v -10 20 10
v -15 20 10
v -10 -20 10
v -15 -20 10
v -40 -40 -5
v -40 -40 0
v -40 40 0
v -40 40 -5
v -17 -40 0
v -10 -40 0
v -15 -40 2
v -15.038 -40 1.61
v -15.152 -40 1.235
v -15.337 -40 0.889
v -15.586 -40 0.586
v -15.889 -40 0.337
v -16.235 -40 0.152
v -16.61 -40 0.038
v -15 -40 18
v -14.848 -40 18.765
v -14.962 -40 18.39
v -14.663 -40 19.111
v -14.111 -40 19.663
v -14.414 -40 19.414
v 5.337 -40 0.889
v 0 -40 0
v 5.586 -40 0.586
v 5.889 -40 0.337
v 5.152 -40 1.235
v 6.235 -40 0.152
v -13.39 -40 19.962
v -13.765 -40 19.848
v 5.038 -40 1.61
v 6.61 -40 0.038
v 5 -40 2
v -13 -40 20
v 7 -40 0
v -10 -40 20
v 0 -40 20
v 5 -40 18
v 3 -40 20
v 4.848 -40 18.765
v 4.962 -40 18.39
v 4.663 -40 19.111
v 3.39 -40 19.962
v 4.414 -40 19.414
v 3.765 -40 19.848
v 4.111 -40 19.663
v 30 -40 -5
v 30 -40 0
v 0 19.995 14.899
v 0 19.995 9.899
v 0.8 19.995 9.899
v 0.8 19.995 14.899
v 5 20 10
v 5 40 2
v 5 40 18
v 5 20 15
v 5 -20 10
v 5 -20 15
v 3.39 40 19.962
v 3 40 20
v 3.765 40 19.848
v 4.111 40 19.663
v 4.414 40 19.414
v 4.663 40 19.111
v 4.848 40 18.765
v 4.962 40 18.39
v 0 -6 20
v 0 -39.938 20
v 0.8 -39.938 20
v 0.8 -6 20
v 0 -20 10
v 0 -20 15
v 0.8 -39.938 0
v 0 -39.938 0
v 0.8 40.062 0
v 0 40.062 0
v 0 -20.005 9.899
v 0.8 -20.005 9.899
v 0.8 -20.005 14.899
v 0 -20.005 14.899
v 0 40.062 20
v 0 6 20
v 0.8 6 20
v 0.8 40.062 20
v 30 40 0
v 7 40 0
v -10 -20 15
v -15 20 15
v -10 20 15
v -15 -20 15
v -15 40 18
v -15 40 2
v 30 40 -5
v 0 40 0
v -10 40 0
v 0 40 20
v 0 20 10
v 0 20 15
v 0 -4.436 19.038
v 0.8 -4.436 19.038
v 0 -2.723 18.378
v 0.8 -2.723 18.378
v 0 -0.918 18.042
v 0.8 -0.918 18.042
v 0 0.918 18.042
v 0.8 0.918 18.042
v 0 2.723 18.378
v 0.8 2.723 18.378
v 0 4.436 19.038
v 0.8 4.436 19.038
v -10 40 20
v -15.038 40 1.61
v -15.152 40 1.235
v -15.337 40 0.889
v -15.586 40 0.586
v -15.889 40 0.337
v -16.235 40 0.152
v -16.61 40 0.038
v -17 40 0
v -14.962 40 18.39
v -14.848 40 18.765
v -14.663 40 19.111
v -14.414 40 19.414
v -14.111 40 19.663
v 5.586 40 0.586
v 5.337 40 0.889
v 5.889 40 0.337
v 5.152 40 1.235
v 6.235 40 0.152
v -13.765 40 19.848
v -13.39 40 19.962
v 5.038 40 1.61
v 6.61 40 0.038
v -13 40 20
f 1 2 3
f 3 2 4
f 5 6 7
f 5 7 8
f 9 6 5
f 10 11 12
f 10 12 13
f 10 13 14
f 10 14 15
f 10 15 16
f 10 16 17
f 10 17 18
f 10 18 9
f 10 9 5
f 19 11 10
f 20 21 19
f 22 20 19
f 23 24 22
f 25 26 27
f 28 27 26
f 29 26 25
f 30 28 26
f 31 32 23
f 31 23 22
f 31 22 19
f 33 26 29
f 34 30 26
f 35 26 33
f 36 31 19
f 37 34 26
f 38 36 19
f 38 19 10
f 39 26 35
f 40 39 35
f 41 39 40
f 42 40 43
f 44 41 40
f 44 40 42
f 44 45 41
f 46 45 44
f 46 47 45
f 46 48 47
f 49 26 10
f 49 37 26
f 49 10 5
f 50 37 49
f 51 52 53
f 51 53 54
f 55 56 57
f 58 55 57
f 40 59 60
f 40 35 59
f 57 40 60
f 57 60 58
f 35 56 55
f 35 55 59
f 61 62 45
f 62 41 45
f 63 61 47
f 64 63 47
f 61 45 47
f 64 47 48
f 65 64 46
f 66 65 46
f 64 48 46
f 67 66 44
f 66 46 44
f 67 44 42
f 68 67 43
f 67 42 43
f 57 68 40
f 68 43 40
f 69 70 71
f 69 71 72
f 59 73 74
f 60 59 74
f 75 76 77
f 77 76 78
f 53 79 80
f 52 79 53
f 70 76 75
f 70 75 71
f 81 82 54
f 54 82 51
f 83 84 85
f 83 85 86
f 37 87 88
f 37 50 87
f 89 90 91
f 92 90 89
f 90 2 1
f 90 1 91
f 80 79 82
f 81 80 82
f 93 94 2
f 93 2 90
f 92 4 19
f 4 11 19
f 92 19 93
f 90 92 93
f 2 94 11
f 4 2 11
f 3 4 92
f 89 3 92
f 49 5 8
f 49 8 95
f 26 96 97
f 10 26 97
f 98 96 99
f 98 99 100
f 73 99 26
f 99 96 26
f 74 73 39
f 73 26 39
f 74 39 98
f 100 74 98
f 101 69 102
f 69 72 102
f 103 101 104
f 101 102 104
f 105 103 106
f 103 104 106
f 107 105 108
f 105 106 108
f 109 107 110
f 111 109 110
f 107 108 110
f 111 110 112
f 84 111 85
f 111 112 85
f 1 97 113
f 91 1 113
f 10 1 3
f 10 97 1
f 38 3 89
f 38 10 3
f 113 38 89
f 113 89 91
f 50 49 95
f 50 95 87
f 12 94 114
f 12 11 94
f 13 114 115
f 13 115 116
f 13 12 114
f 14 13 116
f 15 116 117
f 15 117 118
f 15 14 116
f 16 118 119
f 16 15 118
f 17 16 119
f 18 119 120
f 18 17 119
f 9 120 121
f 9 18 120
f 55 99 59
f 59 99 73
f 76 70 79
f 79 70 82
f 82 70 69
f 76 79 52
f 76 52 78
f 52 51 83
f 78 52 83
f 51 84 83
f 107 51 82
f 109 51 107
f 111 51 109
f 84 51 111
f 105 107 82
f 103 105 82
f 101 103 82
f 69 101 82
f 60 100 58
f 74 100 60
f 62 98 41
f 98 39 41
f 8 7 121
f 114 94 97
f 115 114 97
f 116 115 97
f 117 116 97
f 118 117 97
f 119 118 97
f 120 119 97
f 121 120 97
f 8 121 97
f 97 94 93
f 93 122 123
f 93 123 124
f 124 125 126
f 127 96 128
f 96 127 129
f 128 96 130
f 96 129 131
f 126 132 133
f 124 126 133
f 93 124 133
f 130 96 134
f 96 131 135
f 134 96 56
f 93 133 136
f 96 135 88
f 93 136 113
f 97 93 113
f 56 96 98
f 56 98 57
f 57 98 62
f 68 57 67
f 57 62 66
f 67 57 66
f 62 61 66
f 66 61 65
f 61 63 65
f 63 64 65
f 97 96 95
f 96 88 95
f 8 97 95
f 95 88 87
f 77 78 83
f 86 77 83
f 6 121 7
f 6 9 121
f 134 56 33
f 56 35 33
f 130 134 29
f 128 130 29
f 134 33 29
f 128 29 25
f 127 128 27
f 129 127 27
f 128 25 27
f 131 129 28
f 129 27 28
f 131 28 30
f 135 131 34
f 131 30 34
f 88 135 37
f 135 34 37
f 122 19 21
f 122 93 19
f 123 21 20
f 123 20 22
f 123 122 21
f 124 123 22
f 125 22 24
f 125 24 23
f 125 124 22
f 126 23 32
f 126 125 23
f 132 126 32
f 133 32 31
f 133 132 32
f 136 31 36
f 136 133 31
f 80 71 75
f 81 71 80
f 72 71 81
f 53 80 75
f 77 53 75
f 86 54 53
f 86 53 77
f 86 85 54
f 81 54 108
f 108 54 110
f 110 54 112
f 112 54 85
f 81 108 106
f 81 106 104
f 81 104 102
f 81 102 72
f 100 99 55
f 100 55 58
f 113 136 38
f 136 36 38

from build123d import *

# Parameters (mm, degrees)
F0_W     = 5
F0_H     = 20
F1_DEPTH = 40
F2_R     = 2
F3_R     = 2
F4_W     = 40
F4_H     = 5
F5_DEPTH = 25
F6_R     = 10
F7_DEPTH = 25
F8_W     = 80
F8_H     = 20
F8_W_2   = 40
F8_H_2   = 5
F9_DEPTH = 0.8


with BuildPart() as f1:
    # F0 (on Front) → F1 (new body, symmetric)
    with BuildSketch(Plane.XZ):
        with Locations((-12.5, 10)):
            Rectangle(F0_W, F0_H)
        Polygon((0, 0), (-10, 0), (-15, 0), (-40, 0), (-40, -5), (0, -5), align=None)
        with Locations((2.5, 10)):
            Rectangle(F0_W, F0_H)
        Polygon((5, 0), (0, 0), (0, -5), (30, -5), (30, 0), align=None)
    extrude(amount=F1_DEPTH, both=True)

    # F2
    f2_edges = [f1.edges().sort_by_distance(p)[0] for p in [
        (5, 0, 0),
        (-15, 0, 0),
    ]]
    fillet(f2_edges, radius=F2_R)

    # F3
    f3_edges = [f1.edges().sort_by_distance(p)[0] for p in [
        (-15, 0, 20),
        (5, 0, 20),
    ]]
    fillet(f3_edges, radius=F3_R)

    # F4 (on face) → F5 (cut)
    with BuildSketch(Plane(origin=(-15, 0, 0), x_dir=(0, -1, 0), z_dir=(-1, 0, 0))):
        with Locations((0, 12.5)):
            Rectangle(F4_W, F4_H)
    extrude(amount=-F5_DEPTH, mode=Mode.SUBTRACT)


with BuildPart() as f7:
    # F6 (on face) → F7 (new body)
    with BuildSketch(Plane.YZ.offset(5)):
        with Locations((0, 28)):
            Circle(F6_R)
    extrude(amount=-F7_DEPTH)


with BuildPart() as f9:
    # F8 (on Right) → F9 (new body)
    with BuildSketch(Plane.YZ):
        with Locations((0.0616917014, 10)):
            Rectangle(F8_W, F8_H)
        with Locations((-0.0052317232, 12.3988804966)):
            Rectangle(F8_W_2, F8_H_2, mode=Mode.SUBTRACT)
    extrude(amount=F9_DEPTH)

    # F10: cut F7
    add(f7.part, mode=Mode.SUBTRACT)


solid = Compound([f1.part, f9.part])
